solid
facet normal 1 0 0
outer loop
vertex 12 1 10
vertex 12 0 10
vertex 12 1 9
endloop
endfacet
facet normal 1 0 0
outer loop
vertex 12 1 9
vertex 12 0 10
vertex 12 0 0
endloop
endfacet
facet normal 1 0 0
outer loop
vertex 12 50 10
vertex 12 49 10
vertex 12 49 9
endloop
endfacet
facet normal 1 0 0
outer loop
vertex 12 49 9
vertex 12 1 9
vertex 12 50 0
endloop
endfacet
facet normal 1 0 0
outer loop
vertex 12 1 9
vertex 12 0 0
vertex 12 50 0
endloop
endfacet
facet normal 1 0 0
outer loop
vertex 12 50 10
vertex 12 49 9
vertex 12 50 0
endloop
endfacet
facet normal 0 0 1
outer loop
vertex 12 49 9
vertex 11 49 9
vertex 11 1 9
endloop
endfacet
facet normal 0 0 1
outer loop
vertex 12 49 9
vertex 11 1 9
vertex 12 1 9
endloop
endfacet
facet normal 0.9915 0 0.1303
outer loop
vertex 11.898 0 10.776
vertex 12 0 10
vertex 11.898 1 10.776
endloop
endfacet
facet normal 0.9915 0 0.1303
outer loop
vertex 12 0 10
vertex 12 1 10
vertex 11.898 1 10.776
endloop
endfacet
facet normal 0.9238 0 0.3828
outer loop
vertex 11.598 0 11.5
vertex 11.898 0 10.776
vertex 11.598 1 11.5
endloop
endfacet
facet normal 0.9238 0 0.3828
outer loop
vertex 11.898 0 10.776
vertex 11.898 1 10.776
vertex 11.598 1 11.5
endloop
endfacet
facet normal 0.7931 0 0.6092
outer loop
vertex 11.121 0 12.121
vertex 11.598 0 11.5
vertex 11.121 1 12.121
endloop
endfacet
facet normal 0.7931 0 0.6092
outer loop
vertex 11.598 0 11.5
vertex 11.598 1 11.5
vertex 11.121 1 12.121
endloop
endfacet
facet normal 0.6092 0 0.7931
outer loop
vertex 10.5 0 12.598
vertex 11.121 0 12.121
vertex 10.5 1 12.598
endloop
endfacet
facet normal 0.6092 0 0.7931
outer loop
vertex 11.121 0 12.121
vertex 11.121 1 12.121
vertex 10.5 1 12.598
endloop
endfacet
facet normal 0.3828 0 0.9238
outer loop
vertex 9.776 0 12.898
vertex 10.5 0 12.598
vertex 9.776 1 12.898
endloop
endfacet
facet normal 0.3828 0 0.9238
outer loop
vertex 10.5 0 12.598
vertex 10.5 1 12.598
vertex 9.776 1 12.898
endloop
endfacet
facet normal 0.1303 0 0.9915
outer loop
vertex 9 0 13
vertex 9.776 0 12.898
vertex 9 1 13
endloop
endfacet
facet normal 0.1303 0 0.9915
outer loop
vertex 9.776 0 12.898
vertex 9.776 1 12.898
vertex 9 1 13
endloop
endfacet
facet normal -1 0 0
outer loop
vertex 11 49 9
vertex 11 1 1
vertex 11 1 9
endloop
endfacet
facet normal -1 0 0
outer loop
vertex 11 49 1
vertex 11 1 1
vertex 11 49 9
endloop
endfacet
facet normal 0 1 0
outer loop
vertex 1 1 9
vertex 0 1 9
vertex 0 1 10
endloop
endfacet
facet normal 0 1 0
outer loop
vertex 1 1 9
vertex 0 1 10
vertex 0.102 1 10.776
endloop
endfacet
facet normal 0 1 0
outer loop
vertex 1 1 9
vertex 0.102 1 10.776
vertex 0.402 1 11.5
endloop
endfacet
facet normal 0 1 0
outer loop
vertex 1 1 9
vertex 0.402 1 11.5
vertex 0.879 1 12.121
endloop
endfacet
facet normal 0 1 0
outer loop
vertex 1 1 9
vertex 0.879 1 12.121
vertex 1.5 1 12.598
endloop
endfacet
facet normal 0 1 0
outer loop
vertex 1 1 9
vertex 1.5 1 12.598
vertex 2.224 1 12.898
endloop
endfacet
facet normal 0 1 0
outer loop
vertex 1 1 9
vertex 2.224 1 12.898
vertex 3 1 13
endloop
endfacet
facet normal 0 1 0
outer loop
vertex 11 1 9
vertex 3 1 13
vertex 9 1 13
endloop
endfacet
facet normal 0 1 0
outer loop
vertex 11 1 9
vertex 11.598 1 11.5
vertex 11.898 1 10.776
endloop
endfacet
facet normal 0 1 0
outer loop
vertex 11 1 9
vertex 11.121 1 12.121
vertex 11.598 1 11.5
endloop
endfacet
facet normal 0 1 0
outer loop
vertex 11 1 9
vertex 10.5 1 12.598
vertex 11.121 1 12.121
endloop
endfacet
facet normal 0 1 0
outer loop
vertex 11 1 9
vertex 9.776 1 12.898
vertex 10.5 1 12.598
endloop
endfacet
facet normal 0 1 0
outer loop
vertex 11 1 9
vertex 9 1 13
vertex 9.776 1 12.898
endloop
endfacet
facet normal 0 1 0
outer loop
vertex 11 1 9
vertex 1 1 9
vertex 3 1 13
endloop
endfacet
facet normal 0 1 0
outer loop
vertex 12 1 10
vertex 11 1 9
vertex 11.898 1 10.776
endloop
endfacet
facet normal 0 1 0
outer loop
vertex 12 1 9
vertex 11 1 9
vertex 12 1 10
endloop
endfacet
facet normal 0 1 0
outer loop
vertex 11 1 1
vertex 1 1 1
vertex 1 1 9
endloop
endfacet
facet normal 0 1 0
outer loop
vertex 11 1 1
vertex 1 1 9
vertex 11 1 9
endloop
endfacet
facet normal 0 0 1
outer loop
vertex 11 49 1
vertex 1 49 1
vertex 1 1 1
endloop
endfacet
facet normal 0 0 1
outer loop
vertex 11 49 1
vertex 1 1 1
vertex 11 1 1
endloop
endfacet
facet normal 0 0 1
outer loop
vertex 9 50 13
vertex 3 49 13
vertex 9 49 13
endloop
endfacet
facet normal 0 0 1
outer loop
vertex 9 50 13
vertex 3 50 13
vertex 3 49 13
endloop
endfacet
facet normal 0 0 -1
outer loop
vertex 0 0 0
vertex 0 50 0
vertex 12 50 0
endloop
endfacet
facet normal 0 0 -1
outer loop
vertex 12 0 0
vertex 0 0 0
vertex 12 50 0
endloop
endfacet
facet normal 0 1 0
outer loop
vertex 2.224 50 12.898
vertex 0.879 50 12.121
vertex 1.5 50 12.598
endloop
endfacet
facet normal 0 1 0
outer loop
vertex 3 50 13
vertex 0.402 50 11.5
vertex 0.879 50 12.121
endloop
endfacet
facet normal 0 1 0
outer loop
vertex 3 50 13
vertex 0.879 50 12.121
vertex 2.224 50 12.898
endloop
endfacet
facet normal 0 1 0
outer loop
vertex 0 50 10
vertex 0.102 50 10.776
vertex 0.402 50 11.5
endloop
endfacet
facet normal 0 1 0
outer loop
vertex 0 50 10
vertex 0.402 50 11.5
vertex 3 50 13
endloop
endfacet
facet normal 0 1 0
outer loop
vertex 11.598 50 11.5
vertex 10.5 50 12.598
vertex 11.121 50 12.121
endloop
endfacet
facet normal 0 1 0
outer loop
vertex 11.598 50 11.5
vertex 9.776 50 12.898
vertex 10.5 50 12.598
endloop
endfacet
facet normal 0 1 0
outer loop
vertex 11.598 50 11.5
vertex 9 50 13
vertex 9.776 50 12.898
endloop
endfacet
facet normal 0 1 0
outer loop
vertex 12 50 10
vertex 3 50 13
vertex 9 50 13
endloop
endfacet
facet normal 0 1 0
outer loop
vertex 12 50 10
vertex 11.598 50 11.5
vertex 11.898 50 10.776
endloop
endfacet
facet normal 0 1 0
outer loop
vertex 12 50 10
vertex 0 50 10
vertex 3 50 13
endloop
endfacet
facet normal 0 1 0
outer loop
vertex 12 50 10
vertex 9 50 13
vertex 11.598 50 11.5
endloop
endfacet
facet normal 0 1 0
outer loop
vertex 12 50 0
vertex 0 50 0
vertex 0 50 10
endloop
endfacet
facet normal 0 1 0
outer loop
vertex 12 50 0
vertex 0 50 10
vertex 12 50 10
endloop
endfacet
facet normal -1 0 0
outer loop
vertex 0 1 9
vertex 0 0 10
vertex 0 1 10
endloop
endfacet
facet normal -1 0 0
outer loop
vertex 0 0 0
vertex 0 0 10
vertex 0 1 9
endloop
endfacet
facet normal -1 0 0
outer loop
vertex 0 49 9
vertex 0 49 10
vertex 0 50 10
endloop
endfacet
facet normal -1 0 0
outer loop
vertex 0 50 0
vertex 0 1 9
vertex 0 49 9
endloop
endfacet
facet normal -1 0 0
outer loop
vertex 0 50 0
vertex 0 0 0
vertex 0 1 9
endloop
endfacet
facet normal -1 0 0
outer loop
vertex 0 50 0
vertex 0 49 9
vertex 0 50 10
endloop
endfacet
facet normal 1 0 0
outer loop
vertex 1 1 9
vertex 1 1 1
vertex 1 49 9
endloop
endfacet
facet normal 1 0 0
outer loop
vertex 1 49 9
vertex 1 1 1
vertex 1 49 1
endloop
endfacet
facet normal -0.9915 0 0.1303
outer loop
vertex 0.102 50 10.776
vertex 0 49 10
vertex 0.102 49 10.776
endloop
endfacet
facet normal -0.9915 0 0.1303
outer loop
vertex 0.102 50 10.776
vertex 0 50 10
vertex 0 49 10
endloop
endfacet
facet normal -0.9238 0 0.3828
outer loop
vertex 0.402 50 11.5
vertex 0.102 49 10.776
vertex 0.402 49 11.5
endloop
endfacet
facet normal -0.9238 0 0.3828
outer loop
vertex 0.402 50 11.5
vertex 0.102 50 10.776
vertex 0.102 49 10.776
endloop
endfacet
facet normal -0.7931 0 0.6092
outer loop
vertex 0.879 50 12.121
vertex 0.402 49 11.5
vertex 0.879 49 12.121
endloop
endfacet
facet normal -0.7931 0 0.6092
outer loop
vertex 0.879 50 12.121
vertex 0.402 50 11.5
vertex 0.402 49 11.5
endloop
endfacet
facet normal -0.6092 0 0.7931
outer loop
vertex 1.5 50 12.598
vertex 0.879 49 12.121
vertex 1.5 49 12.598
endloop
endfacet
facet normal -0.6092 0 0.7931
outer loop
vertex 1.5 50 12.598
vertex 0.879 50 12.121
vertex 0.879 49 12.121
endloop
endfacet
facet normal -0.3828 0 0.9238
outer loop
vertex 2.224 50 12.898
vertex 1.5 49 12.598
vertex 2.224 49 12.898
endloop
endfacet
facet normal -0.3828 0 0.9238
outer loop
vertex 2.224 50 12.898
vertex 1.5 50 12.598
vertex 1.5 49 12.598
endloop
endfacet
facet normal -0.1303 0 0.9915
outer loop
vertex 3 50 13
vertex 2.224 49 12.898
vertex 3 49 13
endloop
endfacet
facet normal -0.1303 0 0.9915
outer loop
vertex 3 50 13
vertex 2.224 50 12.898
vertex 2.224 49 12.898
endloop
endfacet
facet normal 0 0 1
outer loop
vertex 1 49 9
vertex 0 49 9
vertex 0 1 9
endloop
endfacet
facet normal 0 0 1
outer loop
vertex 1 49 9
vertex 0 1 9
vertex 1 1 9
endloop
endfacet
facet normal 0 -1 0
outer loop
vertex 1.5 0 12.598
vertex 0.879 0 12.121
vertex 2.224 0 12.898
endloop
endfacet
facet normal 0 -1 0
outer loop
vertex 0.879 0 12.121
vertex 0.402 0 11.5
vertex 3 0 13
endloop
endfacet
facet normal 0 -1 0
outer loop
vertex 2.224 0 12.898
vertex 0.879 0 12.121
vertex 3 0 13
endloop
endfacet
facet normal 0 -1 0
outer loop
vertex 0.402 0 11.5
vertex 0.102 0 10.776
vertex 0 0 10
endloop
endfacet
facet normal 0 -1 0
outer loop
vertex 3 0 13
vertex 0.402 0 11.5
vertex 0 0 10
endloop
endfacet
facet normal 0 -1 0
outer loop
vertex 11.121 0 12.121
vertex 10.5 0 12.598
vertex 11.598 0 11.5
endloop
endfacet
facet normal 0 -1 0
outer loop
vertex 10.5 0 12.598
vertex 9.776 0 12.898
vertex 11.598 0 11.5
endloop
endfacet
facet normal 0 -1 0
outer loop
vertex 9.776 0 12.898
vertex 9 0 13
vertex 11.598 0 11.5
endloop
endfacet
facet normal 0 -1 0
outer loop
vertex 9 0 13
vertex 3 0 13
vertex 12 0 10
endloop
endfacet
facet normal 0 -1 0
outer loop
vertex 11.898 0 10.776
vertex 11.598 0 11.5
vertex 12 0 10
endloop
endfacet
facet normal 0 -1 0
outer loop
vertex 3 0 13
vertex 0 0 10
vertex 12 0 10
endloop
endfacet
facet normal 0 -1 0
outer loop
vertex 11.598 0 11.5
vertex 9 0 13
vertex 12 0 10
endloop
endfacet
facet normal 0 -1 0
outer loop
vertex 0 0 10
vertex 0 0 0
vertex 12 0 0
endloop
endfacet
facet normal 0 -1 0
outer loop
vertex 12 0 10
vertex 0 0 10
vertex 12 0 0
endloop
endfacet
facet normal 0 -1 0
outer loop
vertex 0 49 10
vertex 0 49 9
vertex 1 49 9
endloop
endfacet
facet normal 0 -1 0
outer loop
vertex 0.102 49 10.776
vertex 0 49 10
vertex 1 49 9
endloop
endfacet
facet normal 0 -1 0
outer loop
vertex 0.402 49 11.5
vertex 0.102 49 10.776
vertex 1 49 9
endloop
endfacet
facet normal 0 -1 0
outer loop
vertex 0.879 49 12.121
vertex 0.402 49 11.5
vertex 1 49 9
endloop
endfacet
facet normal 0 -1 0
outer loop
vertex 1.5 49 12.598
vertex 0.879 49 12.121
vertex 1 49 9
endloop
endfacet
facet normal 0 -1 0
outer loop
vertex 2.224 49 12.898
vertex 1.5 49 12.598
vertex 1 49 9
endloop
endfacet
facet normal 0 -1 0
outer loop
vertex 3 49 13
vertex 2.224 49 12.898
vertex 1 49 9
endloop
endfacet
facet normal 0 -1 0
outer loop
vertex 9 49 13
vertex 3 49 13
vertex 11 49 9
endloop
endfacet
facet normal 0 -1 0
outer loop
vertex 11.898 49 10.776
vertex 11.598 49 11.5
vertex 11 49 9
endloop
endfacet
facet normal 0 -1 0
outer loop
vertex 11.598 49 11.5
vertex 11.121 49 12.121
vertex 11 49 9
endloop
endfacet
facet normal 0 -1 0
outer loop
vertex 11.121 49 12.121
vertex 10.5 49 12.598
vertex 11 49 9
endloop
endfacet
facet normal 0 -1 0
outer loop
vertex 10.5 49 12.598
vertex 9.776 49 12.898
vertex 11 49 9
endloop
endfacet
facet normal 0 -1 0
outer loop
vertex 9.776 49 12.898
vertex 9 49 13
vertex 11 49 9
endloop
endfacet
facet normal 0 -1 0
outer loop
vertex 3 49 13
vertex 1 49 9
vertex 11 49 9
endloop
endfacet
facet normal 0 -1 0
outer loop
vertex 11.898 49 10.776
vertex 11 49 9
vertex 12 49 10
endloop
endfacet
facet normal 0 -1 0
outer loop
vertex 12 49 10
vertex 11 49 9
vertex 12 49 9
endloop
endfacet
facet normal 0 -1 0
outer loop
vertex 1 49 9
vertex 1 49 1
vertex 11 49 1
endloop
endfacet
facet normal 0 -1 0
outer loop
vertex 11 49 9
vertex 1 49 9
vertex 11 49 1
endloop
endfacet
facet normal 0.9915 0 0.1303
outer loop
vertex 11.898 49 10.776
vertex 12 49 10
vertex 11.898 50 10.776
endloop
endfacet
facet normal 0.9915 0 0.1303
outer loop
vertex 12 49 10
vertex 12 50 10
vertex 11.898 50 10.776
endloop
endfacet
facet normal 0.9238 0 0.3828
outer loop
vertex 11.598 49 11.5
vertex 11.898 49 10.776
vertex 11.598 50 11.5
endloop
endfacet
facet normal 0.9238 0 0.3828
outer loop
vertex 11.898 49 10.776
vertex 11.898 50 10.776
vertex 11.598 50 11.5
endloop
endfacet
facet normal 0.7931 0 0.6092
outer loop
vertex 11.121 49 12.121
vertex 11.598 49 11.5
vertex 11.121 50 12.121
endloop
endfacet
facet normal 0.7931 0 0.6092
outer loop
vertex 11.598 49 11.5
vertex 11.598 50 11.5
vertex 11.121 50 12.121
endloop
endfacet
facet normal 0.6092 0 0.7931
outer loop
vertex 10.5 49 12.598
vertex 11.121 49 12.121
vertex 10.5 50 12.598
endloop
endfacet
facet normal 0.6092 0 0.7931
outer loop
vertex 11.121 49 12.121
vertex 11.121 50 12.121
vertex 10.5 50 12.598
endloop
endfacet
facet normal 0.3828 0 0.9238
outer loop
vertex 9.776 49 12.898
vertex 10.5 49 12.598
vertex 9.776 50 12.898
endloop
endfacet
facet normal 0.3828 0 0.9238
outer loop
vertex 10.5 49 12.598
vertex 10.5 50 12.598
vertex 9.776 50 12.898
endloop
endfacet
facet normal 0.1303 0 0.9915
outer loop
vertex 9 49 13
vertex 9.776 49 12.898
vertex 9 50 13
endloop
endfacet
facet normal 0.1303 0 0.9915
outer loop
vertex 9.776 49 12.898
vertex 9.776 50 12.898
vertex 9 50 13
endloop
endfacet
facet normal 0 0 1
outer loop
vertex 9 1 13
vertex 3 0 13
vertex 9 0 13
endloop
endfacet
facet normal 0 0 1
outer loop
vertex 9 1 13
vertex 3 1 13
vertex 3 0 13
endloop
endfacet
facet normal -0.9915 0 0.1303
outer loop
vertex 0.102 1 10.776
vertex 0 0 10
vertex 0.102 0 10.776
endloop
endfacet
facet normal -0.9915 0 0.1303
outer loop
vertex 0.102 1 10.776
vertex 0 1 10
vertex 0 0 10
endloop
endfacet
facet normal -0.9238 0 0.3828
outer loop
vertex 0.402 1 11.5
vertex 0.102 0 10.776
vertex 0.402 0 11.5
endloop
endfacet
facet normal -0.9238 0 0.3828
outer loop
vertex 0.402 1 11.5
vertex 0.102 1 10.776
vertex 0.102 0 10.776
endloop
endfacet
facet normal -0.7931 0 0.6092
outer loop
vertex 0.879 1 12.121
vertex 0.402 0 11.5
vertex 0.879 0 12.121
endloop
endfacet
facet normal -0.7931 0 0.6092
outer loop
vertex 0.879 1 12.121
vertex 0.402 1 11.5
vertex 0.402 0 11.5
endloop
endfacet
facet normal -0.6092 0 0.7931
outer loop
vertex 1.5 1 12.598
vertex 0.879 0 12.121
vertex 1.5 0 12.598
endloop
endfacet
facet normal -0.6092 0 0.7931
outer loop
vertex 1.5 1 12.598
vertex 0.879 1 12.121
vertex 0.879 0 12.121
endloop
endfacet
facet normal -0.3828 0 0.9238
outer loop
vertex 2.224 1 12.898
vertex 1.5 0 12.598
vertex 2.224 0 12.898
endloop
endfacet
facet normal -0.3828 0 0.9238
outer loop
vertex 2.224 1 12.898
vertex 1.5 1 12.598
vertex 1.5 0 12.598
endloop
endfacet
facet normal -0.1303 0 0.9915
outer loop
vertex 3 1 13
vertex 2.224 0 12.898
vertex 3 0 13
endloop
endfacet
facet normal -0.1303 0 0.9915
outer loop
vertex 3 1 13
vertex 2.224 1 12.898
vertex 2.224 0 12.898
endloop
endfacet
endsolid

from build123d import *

# Parameters (mm, degrees)
BOX002_W     = 12
BOX002_H     = 48
BOX002_DEPTH = 4
BOX001_W     = 10
BOX001_H     = 48
BOX001_DEPTH = 12
BOX_W        = 12
BOX_H        = 50
BOX_DEPTH    = 13
FILLET_R     = 3


with BuildPart() as kostka002:
    # Box002 → Box002 (new body)
    with BuildSketch(Plane(origin=(0, 1, 9), x_dir=(1, 0, 0), z_dir=(0, 0, 1))):
        with Locations((6, 24)):
            Rectangle(BOX002_W, BOX002_H)
    extrude(amount=BOX002_DEPTH)


with BuildPart() as kostka001:
    # Box001 → Box001 (new body)
    with BuildSketch(Plane(origin=(1, 1, 1), x_dir=(1, 0, 0), z_dir=(0, 0, 1))):
        with Locations((5, 24)):
            Rectangle(BOX001_W, BOX001_H)
    extrude(amount=BOX001_DEPTH)


with BuildPart() as fillet_body:
    # Box → Box (new body)
    with BuildSketch(Plane.XY):
        with Locations((6, 25)):
            Rectangle(BOX_W, BOX_H)
    extrude(amount=BOX_DEPTH)

    # Cut: cut Kostka001
    add(kostka001.part, mode=Mode.SUBTRACT)

    # Cut001: cut Kostka002
    add(kostka002.part, mode=Mode.SUBTRACT)

    # Fillet
    fillet_edges = [fillet_body.edges().sort_by_distance(p)[0] for p in [
        (0, 0.5, 13),
        (0, 49.5, 13),
        (12, 0.5, 13),
        (12, 49.5, 13),
    ]]
    fillet(fillet_edges, radius=FILLET_R)


solid = fillet_body.part
